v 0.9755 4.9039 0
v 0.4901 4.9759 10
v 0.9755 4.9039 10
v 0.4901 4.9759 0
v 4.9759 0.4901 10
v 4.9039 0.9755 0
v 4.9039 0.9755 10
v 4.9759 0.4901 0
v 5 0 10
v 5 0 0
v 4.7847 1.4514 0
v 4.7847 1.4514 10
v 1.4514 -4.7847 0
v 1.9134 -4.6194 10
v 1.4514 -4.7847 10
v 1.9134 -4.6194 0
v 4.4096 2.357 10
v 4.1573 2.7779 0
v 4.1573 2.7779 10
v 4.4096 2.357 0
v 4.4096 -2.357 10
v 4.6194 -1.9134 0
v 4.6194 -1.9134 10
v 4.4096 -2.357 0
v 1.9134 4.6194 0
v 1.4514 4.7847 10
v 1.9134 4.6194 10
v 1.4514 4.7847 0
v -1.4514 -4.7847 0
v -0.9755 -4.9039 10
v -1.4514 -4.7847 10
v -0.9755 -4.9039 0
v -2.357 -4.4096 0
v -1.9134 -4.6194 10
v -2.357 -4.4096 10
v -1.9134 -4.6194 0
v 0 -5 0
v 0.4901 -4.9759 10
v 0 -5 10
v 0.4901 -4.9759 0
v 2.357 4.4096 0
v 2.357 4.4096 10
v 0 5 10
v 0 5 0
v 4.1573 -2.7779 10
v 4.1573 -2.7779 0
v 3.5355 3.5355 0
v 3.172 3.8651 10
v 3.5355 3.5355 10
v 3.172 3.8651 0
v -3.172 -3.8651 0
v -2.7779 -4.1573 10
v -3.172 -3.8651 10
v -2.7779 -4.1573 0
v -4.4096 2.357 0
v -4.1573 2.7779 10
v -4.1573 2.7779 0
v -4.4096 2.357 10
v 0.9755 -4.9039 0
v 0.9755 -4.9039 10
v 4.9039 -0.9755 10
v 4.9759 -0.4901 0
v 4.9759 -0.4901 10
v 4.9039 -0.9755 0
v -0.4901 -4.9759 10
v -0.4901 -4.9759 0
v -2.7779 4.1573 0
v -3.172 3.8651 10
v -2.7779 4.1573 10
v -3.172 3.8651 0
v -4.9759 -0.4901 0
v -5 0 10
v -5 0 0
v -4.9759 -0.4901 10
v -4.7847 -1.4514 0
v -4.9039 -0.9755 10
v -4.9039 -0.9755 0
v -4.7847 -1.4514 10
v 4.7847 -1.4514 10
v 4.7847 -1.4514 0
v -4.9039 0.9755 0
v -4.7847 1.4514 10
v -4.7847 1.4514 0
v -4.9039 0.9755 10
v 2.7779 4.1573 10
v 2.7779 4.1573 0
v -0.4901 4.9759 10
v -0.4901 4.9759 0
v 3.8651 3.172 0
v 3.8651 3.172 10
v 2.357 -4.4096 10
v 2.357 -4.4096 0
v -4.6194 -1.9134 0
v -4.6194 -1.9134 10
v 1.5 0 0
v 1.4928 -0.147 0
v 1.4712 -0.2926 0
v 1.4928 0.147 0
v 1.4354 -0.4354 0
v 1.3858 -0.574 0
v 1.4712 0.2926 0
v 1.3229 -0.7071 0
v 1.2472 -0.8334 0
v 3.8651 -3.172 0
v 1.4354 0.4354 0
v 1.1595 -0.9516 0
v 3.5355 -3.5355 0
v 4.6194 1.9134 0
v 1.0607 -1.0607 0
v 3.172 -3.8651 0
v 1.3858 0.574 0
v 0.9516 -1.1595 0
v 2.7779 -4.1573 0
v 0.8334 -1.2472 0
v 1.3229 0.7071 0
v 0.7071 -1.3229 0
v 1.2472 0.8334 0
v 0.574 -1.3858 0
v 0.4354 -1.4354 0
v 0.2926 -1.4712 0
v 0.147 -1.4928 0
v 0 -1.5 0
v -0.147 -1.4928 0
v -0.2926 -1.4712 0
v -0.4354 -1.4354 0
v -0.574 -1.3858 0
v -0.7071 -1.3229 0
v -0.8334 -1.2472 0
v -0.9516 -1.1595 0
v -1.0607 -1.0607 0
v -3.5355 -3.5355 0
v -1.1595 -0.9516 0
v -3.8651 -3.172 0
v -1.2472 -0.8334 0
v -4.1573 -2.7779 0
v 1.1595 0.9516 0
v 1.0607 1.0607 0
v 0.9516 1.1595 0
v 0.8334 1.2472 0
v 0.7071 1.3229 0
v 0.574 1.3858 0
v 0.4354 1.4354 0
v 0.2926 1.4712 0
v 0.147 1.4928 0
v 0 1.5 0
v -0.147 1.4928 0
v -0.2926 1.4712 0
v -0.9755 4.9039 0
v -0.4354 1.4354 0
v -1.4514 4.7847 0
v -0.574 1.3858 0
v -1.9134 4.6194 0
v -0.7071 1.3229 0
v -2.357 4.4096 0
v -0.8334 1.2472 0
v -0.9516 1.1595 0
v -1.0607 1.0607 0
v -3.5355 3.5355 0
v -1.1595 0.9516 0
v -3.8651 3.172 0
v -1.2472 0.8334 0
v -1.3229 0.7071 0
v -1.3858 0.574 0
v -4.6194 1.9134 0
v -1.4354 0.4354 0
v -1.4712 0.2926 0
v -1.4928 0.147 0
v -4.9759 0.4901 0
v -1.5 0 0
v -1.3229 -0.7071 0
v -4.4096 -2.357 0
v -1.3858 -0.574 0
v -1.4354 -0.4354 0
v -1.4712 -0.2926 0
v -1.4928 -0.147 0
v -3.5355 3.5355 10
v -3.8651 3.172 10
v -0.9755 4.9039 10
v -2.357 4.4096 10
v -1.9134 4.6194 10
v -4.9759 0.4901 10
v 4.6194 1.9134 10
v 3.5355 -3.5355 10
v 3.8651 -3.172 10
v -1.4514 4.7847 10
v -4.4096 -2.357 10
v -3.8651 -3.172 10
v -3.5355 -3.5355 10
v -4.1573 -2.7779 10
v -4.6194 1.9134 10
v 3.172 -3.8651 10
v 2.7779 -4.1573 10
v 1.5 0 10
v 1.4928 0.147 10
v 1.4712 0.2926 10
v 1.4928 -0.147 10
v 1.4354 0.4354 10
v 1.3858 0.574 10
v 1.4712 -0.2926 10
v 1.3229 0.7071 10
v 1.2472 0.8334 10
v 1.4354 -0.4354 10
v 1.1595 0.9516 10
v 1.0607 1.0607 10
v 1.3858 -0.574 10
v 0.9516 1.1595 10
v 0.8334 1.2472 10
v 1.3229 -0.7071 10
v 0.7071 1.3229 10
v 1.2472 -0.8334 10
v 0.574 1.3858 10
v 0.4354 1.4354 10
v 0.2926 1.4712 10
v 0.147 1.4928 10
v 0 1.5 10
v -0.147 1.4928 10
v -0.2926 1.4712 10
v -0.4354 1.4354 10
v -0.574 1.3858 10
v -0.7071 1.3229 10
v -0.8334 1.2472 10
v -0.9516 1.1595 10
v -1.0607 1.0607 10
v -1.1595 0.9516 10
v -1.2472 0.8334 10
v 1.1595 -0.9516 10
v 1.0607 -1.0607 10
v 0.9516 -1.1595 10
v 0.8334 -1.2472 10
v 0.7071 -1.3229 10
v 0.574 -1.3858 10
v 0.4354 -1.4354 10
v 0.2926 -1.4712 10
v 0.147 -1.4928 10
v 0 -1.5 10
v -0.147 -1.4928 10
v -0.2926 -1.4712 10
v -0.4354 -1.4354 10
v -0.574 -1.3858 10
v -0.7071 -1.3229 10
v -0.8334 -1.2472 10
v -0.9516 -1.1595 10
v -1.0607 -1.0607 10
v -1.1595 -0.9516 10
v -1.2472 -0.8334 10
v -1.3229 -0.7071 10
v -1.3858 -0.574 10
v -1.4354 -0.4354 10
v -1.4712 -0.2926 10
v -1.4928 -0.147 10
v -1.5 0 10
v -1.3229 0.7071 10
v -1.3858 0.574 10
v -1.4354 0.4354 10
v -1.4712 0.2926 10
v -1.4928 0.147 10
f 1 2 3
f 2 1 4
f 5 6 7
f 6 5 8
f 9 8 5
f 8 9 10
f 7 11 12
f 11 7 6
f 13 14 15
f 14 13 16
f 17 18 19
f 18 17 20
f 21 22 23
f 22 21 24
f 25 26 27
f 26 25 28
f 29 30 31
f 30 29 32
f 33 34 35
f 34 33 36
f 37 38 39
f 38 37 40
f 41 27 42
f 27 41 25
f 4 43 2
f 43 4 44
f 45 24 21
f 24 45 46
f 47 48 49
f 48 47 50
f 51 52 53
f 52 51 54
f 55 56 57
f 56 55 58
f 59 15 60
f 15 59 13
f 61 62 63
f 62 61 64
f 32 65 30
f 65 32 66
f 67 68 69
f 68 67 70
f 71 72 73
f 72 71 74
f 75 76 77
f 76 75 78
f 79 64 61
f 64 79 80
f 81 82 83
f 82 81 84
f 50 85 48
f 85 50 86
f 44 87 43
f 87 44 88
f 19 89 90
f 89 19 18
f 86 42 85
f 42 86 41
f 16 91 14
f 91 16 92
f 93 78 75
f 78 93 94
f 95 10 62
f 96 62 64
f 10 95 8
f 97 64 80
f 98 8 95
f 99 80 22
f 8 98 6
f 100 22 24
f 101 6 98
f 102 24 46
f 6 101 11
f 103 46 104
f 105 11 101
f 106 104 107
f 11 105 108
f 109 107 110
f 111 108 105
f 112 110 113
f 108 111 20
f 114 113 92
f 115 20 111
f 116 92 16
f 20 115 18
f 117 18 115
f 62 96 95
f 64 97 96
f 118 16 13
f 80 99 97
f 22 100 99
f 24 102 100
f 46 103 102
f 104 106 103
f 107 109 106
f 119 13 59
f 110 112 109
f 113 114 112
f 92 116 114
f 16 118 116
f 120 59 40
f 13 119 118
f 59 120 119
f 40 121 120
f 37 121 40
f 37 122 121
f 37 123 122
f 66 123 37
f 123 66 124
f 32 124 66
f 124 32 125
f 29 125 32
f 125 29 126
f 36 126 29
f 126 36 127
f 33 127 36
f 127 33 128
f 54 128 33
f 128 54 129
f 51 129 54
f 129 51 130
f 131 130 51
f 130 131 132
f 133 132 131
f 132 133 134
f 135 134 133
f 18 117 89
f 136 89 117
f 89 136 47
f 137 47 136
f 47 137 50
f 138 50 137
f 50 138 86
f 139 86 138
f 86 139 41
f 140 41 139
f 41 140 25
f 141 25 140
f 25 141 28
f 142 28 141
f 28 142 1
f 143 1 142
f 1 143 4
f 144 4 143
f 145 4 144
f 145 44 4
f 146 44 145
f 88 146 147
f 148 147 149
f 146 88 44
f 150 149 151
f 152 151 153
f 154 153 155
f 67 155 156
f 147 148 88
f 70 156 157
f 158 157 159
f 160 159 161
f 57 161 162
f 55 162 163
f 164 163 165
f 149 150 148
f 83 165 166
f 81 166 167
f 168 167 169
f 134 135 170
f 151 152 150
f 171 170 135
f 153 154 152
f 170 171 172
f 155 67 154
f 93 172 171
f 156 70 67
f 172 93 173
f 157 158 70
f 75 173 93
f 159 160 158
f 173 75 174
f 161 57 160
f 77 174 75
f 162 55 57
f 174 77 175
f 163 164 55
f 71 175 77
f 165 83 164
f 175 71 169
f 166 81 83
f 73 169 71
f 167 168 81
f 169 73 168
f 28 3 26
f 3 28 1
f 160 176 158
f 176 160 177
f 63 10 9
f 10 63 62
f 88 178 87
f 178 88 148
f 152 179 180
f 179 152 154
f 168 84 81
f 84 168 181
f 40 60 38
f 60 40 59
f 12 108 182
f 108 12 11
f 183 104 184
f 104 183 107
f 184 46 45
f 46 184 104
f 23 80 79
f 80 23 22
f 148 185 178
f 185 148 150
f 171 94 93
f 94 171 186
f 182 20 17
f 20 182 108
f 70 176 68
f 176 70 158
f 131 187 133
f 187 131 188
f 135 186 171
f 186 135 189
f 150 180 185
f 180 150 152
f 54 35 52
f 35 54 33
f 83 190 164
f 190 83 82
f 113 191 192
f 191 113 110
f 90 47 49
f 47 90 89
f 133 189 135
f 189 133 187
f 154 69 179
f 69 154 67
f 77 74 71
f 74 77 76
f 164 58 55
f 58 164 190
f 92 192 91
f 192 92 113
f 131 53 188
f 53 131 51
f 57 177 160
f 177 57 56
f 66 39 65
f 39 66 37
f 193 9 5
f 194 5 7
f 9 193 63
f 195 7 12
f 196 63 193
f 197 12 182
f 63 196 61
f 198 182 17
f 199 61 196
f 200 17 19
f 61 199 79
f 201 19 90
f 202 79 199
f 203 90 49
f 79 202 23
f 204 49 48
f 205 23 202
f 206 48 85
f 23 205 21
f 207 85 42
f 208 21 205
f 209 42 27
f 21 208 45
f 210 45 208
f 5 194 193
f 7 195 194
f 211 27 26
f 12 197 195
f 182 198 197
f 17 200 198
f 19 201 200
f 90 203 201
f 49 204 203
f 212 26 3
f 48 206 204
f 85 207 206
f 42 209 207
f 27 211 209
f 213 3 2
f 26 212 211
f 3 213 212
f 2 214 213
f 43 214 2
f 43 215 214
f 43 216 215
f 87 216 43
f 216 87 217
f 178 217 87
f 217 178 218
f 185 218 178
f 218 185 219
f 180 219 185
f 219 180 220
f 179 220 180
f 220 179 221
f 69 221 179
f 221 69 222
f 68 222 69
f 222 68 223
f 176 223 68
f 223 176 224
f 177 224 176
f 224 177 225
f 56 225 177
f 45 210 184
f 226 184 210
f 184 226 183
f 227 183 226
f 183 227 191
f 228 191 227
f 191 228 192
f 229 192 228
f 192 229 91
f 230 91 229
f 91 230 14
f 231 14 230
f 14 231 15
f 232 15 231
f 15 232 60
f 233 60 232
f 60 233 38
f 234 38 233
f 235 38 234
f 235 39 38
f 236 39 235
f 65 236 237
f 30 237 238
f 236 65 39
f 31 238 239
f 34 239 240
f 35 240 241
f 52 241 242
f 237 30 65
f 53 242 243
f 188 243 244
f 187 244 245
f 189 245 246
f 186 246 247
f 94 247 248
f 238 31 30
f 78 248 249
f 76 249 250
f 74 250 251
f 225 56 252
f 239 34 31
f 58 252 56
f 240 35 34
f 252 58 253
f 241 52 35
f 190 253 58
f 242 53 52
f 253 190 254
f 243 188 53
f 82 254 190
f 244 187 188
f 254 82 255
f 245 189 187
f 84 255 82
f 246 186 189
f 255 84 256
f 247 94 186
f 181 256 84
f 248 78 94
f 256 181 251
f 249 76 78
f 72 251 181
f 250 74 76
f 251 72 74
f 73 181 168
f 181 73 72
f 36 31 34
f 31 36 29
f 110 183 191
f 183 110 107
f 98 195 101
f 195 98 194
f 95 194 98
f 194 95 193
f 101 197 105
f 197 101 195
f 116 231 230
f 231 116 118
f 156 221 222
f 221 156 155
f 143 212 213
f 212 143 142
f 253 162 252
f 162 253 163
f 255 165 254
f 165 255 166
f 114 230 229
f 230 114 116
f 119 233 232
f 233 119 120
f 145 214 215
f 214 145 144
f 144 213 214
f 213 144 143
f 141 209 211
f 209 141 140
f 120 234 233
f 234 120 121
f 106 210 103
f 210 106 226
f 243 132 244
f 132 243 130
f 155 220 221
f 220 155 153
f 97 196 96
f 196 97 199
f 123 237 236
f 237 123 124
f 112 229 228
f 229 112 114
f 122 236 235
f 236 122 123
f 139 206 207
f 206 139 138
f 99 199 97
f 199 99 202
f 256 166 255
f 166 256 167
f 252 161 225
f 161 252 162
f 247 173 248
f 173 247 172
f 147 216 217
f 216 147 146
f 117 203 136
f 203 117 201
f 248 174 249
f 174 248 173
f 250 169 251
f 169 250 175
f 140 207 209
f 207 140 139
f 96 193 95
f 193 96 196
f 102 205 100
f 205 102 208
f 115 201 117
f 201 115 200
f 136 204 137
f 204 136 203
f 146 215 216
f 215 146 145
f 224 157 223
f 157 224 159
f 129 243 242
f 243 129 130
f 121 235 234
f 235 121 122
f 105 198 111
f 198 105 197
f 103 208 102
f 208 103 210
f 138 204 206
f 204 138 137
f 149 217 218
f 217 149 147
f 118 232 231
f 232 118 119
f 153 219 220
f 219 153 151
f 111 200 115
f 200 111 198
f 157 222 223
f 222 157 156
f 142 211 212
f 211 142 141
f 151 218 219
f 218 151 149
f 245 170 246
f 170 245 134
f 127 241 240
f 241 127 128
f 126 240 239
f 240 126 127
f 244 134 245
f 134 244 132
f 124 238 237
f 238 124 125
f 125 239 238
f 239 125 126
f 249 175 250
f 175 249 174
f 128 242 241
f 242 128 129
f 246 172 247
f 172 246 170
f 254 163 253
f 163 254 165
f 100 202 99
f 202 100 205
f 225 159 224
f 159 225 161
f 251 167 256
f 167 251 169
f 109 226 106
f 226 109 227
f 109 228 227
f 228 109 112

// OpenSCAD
height = 10;
inner_diameter = 3;
outer_diameter = 10;

spacer();

module spacer()
{
  difference()
  {
    cylinder(d=outer_diameter, h=height, $fn=64);
    cylinder(d=inner_diameter, h=height, $fn=64);
  }
}
